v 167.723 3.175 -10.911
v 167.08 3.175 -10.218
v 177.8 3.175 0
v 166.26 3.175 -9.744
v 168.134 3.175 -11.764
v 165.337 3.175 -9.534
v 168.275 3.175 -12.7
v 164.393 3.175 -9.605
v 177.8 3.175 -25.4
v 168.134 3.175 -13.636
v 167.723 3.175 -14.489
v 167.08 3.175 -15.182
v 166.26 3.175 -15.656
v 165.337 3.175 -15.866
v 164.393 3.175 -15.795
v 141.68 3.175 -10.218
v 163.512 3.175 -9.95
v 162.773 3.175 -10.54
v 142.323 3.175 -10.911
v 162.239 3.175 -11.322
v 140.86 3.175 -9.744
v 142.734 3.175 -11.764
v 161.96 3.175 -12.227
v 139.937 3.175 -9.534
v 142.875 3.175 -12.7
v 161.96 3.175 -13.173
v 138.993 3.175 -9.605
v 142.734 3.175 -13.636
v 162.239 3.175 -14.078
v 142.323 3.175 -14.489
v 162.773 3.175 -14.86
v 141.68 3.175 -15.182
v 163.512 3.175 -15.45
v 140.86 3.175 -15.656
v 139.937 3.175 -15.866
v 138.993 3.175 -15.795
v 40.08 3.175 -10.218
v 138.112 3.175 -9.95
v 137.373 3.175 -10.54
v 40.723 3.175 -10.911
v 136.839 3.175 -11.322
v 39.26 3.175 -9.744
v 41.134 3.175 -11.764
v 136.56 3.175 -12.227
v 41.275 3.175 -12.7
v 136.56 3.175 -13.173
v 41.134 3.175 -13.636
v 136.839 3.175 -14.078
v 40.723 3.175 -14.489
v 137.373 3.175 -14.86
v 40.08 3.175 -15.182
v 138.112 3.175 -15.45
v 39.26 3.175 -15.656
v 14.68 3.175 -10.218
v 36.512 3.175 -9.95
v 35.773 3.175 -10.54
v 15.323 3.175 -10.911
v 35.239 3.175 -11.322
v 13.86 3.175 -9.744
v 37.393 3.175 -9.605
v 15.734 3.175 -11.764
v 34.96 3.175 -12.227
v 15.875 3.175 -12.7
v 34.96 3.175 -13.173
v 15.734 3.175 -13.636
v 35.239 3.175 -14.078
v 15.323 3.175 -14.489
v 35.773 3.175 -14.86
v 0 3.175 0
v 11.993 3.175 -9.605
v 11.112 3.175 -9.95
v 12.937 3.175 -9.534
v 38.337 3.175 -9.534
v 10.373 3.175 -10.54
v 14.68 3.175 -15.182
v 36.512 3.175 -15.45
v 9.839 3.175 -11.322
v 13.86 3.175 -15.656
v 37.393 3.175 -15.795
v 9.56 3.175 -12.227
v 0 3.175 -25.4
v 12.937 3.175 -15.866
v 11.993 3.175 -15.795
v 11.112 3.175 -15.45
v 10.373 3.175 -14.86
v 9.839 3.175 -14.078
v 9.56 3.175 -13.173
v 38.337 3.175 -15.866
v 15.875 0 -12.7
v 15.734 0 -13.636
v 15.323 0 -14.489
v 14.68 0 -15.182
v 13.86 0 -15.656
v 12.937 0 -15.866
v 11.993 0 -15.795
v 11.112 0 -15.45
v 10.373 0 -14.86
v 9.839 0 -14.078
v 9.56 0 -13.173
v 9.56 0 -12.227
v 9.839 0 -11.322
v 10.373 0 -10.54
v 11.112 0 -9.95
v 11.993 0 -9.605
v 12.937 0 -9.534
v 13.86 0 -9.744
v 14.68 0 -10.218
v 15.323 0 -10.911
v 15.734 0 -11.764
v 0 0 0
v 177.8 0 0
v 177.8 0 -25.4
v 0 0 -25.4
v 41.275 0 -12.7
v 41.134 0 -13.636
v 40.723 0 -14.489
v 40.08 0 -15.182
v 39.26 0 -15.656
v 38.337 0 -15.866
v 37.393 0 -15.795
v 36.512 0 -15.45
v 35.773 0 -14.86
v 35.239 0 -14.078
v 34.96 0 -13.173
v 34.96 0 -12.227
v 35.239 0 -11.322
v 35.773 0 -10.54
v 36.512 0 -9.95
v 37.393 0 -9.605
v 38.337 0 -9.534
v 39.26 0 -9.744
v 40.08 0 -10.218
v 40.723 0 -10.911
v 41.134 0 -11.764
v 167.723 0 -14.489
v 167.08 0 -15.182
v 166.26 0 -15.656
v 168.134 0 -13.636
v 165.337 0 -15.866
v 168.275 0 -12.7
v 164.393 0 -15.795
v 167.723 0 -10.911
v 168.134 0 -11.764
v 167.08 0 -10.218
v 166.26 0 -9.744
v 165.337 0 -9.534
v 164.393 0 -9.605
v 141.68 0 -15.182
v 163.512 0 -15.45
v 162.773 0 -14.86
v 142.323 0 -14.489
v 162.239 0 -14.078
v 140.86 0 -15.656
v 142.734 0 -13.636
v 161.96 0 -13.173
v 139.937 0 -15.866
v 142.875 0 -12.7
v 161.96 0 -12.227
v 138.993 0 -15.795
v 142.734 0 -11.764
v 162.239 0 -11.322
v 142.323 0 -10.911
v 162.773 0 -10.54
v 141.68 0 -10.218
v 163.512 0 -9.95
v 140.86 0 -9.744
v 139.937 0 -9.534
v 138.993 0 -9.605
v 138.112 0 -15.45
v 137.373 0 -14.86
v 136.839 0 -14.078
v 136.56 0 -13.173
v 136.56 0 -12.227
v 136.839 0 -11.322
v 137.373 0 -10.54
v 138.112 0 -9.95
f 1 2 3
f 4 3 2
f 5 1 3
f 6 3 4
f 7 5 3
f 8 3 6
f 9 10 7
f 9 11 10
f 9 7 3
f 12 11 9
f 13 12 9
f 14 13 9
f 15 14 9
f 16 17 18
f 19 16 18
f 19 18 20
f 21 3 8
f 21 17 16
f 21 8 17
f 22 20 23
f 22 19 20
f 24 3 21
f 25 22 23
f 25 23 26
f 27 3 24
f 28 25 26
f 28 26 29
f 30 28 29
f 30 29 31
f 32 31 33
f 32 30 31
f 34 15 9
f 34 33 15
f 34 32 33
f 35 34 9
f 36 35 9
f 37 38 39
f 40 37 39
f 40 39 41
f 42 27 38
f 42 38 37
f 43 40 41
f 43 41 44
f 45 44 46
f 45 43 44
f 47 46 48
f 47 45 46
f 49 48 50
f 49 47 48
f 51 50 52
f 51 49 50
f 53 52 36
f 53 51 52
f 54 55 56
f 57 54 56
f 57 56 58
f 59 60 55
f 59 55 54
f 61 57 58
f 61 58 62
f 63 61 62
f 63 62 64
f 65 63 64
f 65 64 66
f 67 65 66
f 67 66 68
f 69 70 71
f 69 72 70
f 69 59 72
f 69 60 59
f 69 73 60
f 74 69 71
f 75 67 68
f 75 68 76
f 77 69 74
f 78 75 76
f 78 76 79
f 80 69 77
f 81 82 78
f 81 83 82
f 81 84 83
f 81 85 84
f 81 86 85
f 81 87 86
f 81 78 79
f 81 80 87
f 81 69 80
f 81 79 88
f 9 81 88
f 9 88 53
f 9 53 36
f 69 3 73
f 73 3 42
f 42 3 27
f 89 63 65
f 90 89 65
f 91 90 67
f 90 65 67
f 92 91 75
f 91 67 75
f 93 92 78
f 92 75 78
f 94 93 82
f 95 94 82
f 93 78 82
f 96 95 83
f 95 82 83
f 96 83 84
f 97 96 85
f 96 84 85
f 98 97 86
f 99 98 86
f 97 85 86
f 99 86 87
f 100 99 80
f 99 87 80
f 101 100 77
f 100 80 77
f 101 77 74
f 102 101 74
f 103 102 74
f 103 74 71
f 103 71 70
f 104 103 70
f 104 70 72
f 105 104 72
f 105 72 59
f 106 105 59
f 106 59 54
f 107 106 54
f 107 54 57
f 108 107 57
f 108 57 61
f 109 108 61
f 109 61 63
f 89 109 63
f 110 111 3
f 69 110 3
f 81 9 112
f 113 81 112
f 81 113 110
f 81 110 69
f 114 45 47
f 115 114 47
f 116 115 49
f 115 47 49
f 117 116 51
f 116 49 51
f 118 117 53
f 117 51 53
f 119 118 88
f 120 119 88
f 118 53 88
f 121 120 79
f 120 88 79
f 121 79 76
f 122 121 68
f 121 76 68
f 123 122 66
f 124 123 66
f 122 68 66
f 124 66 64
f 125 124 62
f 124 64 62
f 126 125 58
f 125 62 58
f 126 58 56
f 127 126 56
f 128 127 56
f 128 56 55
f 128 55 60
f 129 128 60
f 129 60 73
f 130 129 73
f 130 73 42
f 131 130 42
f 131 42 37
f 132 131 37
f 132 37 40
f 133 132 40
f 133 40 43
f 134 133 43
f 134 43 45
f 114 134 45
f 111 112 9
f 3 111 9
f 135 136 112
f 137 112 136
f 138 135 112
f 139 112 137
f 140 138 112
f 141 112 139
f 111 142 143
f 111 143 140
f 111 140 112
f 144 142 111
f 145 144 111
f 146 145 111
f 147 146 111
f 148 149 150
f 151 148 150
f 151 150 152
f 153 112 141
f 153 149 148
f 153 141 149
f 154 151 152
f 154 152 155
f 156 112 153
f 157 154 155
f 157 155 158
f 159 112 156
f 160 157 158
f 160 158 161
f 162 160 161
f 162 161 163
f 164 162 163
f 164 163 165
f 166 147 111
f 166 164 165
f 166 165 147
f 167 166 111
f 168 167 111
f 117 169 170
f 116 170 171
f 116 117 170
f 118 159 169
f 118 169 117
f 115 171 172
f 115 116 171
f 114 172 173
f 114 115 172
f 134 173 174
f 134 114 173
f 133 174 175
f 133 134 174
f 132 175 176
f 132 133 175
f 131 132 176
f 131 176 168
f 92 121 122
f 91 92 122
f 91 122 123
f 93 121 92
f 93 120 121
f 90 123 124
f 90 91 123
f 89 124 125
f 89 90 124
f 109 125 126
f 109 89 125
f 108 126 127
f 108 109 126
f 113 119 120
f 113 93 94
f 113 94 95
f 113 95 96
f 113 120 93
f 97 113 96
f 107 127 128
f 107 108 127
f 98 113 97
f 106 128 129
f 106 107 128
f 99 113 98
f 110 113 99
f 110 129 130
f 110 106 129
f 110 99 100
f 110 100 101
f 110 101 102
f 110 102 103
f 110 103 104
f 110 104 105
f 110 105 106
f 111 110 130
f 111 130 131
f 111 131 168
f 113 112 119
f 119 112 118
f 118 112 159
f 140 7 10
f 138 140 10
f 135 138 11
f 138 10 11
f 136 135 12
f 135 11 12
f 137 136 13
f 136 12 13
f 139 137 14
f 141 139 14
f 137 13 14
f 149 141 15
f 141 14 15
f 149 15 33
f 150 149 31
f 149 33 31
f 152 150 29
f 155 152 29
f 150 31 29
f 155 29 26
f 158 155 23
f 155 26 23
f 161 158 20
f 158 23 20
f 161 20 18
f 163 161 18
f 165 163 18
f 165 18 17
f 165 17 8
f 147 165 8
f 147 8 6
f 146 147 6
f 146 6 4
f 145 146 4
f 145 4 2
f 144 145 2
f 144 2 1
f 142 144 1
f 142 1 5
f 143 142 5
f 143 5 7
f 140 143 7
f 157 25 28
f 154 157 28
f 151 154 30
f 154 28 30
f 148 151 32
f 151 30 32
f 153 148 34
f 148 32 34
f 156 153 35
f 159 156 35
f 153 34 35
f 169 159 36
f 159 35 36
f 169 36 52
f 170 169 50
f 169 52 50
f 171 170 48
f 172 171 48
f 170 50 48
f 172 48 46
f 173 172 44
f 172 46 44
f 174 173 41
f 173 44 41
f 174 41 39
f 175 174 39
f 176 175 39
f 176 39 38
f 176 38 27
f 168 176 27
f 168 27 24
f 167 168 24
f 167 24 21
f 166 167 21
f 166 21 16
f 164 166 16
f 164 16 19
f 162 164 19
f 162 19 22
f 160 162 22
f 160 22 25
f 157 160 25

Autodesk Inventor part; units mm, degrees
ref_plane "YZ Plane" through (0, 0, 0) normal (1, 0, 0) x (0, 1, 0)
ref_plane "XZ Plane" through (0, 0, 0) normal (0, 1, 0) x (-1, 0, 0)
ref_plane "XY Plane" through (0, 0, 0) normal (0, 0, 1) x (1, 0, 0)
sketch "Sketch1" plane through (0, 0, 0) normal (1, 0, 0) x (0, 1, 0)
  line L0 (0, 0) -> (3.175, 0)
  line L1 (3.175, 0) -> (3.175, -25.4)
  line L2 (3.175, -25.4) -> (0, -25.4)
  line L3 (0, -25.4) -> (0, 0)
  dimension "d0" = 3.175
  dimension "d1" = 25.4
extrude "Extrusion1" add sketch "Sketch1" along normal blind 177.8
sketch "Sketch2" plane through (0, 3.175, 0) normal (0, 1, 0) x (1, 0, 0)
  line L0 (0, 25.4) -> (0, 0) projected
  line L1 (0, 12.7) -> (106.9215, 12.7) construction
  circle A0 centre (12.7, 12.7) radius 3.175
  line L2 (0, 25.4) -> (177.8, 25.4) projected
  line L3 (88.9, 25.4) -> (88.9, 2.1168) construction
  circle A1 centre (38.1, 12.7) radius 3.175
  circle A2 centre (165.1, 12.7) radius 3.175
  circle A3 centre (139.7, 12.7) radius 3.175
  dimension "d4" = 6.35
  dimension "d5" = 50.8
  dimension "d6" = 76.2
extrude "Extrusion2" cut sketch "Sketch2" against normal blind 3.175
properties part number "plate 1"
